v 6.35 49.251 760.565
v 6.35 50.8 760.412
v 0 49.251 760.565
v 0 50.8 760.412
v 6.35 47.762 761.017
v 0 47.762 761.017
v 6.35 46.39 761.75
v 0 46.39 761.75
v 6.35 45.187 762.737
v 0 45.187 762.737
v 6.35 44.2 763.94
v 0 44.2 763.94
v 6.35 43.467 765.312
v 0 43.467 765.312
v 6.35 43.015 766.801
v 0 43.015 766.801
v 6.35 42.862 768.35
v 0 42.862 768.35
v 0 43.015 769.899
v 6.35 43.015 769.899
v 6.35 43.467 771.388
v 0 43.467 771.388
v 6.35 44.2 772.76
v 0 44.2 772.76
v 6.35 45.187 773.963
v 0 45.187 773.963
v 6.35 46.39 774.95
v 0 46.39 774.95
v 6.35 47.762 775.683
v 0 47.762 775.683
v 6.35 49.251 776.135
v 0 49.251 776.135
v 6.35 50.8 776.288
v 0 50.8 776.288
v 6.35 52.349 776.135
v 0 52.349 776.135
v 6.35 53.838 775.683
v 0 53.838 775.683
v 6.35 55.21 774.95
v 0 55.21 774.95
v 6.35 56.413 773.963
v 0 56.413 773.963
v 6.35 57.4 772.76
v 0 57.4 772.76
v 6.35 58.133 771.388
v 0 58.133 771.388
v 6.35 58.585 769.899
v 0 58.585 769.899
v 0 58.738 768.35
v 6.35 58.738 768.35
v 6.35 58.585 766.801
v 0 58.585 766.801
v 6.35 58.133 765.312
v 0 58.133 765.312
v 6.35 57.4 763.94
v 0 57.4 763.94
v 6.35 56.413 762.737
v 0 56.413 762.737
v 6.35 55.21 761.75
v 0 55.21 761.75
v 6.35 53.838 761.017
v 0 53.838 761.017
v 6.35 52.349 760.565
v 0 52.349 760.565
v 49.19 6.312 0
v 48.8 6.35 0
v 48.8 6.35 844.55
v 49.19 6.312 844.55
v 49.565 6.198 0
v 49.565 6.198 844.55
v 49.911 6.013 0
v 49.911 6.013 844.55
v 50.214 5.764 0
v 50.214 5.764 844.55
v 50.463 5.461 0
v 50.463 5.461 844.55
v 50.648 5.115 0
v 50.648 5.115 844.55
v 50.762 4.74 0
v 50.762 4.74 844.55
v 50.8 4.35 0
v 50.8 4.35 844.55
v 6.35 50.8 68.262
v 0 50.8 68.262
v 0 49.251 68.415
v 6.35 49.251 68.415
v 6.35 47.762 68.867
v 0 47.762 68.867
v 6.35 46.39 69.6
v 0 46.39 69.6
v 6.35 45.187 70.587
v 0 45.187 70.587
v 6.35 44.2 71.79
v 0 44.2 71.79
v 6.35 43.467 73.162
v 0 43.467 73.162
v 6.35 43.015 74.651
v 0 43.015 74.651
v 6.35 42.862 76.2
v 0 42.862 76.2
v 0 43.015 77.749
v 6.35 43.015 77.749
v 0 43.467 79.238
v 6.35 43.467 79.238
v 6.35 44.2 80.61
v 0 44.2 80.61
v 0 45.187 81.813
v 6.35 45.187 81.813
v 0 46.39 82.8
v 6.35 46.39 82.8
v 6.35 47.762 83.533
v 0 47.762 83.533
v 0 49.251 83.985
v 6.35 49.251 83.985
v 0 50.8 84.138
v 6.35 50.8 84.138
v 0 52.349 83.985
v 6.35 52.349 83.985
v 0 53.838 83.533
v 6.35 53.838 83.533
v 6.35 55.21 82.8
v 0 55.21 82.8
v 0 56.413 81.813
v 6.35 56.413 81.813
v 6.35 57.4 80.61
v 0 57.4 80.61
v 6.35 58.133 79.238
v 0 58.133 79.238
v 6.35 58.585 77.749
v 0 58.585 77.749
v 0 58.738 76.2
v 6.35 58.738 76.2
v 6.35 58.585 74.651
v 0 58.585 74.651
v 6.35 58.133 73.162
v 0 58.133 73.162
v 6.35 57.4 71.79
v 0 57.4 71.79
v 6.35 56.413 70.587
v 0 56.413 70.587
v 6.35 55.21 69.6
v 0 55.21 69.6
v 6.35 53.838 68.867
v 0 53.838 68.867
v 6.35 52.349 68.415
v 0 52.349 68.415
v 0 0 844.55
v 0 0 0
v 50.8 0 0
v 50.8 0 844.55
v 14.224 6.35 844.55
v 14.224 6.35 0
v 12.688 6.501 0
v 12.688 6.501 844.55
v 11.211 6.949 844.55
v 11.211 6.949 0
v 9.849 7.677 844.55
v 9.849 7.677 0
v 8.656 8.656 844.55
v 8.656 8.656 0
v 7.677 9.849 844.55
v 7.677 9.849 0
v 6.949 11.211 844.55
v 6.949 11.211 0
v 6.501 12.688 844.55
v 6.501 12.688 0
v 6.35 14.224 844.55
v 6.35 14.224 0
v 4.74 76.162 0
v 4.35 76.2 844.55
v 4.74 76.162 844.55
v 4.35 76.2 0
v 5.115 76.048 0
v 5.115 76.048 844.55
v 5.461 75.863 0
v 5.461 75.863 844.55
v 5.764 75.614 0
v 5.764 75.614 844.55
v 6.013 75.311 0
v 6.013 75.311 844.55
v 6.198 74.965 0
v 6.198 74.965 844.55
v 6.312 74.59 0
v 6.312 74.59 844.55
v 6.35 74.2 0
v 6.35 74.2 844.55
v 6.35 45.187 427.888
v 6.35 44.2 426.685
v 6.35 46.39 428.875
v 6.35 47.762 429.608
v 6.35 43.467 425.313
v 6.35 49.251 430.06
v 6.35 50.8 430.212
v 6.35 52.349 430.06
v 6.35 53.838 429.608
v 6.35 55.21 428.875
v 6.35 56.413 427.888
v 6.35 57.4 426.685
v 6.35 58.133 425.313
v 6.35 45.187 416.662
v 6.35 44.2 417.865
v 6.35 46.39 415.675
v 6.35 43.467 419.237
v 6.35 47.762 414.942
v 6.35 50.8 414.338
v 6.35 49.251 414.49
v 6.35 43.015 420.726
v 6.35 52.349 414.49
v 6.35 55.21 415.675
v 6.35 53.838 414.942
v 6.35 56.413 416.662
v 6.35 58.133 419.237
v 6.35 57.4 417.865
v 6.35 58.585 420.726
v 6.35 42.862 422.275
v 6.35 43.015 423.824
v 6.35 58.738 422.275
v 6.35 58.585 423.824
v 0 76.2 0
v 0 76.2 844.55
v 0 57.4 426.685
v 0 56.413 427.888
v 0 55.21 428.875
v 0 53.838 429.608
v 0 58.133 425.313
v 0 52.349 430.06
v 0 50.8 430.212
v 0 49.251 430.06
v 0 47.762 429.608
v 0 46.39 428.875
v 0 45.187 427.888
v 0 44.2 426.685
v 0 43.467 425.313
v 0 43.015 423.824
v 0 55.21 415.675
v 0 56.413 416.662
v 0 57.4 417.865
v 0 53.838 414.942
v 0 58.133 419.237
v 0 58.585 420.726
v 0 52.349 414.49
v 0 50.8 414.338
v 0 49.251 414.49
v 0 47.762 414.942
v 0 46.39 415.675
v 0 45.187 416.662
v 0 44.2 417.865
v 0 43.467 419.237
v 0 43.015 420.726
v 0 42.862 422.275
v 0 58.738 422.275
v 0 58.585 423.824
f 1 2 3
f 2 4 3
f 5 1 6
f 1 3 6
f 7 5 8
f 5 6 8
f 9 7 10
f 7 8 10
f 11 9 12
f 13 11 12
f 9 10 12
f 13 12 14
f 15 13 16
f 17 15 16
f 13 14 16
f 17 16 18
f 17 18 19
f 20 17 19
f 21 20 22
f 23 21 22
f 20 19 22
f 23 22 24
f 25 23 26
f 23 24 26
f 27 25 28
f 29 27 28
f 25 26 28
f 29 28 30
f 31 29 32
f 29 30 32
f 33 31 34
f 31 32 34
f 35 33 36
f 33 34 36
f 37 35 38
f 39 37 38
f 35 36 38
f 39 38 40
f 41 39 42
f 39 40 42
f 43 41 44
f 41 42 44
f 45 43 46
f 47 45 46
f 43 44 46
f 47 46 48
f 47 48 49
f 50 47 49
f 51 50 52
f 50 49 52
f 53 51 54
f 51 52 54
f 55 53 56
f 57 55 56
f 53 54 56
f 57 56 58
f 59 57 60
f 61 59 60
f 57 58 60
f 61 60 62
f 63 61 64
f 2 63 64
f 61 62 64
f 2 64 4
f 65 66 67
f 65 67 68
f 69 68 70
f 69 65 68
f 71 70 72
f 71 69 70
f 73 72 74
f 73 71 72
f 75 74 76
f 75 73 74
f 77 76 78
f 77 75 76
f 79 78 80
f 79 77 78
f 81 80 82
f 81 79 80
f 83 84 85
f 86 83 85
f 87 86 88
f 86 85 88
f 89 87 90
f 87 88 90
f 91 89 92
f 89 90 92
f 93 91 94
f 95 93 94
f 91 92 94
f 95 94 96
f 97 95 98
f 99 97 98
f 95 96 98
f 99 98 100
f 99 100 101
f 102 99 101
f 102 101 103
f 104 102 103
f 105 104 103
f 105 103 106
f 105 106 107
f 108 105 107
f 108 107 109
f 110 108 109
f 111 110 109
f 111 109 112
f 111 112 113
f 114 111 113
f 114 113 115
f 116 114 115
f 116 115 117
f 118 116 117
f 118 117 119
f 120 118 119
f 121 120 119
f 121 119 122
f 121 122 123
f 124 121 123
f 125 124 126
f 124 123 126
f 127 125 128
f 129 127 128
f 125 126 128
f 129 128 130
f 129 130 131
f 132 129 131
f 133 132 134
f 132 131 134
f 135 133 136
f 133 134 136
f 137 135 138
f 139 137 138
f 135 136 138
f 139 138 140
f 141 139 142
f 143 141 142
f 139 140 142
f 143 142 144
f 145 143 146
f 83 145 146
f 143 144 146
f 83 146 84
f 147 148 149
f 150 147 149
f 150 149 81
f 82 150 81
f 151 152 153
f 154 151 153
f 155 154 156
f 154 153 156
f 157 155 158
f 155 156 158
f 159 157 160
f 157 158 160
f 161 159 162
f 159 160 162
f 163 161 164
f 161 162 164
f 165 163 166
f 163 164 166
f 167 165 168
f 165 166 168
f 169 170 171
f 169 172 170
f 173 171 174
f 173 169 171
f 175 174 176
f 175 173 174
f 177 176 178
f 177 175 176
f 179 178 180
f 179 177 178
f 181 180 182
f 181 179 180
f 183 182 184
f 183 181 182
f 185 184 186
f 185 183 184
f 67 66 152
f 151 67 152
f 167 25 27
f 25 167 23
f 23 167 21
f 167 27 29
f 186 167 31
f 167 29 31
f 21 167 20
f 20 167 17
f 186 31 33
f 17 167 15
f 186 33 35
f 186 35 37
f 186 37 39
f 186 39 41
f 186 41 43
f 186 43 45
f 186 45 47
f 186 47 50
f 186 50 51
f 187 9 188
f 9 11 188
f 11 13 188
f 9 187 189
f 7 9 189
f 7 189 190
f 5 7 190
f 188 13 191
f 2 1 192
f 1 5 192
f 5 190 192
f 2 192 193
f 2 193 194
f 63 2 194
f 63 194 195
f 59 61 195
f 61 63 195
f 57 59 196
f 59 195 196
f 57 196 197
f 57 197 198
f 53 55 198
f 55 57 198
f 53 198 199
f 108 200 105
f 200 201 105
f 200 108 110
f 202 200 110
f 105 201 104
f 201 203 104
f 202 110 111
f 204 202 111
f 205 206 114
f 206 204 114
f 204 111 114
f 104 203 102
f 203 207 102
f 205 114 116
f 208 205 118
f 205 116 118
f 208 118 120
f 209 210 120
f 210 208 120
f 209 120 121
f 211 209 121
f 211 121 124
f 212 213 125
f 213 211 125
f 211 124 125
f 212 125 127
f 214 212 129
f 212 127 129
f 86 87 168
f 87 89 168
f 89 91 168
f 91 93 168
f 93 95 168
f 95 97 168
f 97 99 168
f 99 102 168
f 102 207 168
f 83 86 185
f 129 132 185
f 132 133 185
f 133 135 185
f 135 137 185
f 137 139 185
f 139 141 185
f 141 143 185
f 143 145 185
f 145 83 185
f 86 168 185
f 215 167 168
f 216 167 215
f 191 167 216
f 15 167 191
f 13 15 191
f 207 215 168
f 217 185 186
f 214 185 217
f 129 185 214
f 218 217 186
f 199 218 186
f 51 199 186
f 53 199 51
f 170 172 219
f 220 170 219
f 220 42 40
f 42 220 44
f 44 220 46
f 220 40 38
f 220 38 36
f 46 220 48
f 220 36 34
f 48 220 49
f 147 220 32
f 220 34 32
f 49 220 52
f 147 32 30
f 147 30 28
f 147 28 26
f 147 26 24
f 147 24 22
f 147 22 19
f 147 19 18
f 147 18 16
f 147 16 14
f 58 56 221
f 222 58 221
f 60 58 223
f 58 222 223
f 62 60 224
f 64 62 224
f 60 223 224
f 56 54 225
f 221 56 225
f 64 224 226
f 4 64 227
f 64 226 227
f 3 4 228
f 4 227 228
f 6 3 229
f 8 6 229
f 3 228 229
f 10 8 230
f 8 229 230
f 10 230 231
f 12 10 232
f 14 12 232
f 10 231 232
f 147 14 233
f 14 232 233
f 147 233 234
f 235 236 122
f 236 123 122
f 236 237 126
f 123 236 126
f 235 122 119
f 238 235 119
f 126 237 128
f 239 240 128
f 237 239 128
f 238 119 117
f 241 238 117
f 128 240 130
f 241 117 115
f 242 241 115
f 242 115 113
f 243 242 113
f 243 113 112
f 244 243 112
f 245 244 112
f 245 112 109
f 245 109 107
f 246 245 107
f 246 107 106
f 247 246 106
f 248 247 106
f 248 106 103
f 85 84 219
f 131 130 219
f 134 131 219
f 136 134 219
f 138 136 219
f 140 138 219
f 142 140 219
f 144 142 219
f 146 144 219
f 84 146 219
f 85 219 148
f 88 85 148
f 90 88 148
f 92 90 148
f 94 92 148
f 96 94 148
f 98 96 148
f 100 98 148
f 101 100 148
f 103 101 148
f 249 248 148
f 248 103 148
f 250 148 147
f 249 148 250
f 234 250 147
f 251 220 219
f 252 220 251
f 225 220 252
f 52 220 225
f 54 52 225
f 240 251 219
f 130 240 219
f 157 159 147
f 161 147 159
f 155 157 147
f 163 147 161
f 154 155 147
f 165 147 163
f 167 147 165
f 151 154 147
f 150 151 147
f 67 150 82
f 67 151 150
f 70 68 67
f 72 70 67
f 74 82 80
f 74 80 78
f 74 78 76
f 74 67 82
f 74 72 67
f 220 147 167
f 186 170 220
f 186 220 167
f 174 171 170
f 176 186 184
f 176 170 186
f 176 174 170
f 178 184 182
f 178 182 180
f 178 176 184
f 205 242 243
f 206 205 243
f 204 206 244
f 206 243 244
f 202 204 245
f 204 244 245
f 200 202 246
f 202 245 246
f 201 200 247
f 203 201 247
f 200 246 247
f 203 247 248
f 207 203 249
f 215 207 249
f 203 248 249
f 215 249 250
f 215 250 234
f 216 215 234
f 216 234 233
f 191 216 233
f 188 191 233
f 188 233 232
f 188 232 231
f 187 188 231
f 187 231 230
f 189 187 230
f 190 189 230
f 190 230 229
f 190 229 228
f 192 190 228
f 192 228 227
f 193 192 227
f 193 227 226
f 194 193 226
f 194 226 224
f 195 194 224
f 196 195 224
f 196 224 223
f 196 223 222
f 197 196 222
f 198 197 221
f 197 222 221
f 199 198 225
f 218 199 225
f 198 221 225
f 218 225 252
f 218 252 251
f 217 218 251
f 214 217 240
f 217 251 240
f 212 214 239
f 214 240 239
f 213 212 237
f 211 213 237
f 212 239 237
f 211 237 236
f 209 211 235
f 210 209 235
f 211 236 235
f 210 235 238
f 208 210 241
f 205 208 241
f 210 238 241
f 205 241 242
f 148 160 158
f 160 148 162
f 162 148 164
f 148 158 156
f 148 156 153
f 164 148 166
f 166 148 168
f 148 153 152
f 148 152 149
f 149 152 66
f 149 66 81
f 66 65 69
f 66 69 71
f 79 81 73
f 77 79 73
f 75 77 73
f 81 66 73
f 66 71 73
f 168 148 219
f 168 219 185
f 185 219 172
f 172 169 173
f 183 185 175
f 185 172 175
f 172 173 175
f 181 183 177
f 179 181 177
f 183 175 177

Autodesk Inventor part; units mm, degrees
ref_plane "YZ Plane" through (0, 0, 0) normal (1, 0, 0) x (0, 1, 0)
ref_plane "Start plane" through (0, 0, 0) normal (0, 0, 1) x (1, 0, 0)
ref_plane "End plane" through (0, 0, 844.55) normal (0, 0, 1) x (1, 0, 0)
sketch "Sketch" plane through (0, 0, 0) normal (0, 0, 1) x (1, 0, 0)
  line L0 (0, 76.2) -> (0, 0)
  line L1 (0, 0) -> (50.8, 0)
  line L2 (50.8, 0) -> (50.8, 4.35)
  line L3 (48.8, 6.35) -> (14.224, 6.35)
  line L4 (6.35, 14.224) -> (6.35, 74.2)
  line L5 (4.35, 76.2) -> (0, 76.2)
  line L6 (-7.0414, 0) -> (21.5385, 0) construction
  line L7 (0, -8.0414) -> (0, 34.5385) construction
  arc A0 (6.35, 14.224) -> (14.224, 6.35) centre (14.224, 14.224) ccw
  arc A1 (50.8, 4.35) -> (48.8, 6.35) centre (48.8, 4.35) ccw
  arc A2 (6.35, 74.2) -> (4.35, 76.2) centre (4.35, 74.2) ccw
  line L8 (0, 93.5453) -> (0, -24.9725) construction
  line L9 (-18.6925, 0) -> (62.8653, 0) construction
  point P0 (50.8, 6.35)
  point P1 (6.35, 6.35)
  point P2 (6.35, 76.2)
  dimension "d12" = 6.35
  dimension "d13" = 76.2
  dimension "d14" = 50.8
  dimension "d15" = 0
  dimension "d16" = 6.35
  dimension "d17" = 0
  dimension "d18" = 7.874
  dimension "d19" = 2
extrude "Body" add sketch "Sketch" along normal up to surface (844.55 mm away) from surface at 0
sketch "Sketch3" plane through (6.35, 14.224, 844.55) normal (1, 0, 0) x (0, 0, -1)
  line L0 (0, 59.976) -> (0, 0) projected
  line L1 (844.55, 59.976) -> (844.55, 0) projected
  line L2 (844.55, 59.976) -> (0, 59.976) projected
  line L3 (0, 36.576) -> (844.55, 36.576) construction
  line L4 (844.55, 61.976) -> (0, 61.976) projected
  point P0 (76.2, 36.576)
  point P1 (422.275, 36.576)
  point P2 (768.35, 36.576)
  dimension "d22" = 76.2
  dimension "d23" = 422.275
  dimension "d24" = 768.35
  dimension "d32" = 25.4
hole "Hole1" at (6.35, 50.8, 768.35) at (6.35, 50.8, 422.275) at (6.35, 50.8, 76.2) direction (-1, 0, 0) diameter 15.875 end through all
equation "\"d12\" = G_T"
equation "\"d13\" = G_H"
equation "\"d14\" = G_W"
equation "\"d16\" = G_T"
equation "\"d18\" = G_IR"
equation "\"d4\" = G_L"
equation "\"G_W\" = 50.8"
equation "\"G_H\" = 76.2"
equation "\"G_T\" = 6.35"
equation "\"G_ER\" = 4.064"
equation "\"G_IR\" = 7.874"
equation "\"G_L\" = B_L + G_OFFSET_START + G_OFFSET_END"
equation "\"ex\" = 0"
equation "\"ey\" = 0"
equation "\"G_OFFSET_START\" = 0"
equation "\"G_OFFSET_END\" = 0"
equation "\"d21\" = G_OFFSET_END + B_L"
equation "\"B_L\" = 844.55"
properties part number "ANSI L 3 x 2 x 1_4 00000011"
